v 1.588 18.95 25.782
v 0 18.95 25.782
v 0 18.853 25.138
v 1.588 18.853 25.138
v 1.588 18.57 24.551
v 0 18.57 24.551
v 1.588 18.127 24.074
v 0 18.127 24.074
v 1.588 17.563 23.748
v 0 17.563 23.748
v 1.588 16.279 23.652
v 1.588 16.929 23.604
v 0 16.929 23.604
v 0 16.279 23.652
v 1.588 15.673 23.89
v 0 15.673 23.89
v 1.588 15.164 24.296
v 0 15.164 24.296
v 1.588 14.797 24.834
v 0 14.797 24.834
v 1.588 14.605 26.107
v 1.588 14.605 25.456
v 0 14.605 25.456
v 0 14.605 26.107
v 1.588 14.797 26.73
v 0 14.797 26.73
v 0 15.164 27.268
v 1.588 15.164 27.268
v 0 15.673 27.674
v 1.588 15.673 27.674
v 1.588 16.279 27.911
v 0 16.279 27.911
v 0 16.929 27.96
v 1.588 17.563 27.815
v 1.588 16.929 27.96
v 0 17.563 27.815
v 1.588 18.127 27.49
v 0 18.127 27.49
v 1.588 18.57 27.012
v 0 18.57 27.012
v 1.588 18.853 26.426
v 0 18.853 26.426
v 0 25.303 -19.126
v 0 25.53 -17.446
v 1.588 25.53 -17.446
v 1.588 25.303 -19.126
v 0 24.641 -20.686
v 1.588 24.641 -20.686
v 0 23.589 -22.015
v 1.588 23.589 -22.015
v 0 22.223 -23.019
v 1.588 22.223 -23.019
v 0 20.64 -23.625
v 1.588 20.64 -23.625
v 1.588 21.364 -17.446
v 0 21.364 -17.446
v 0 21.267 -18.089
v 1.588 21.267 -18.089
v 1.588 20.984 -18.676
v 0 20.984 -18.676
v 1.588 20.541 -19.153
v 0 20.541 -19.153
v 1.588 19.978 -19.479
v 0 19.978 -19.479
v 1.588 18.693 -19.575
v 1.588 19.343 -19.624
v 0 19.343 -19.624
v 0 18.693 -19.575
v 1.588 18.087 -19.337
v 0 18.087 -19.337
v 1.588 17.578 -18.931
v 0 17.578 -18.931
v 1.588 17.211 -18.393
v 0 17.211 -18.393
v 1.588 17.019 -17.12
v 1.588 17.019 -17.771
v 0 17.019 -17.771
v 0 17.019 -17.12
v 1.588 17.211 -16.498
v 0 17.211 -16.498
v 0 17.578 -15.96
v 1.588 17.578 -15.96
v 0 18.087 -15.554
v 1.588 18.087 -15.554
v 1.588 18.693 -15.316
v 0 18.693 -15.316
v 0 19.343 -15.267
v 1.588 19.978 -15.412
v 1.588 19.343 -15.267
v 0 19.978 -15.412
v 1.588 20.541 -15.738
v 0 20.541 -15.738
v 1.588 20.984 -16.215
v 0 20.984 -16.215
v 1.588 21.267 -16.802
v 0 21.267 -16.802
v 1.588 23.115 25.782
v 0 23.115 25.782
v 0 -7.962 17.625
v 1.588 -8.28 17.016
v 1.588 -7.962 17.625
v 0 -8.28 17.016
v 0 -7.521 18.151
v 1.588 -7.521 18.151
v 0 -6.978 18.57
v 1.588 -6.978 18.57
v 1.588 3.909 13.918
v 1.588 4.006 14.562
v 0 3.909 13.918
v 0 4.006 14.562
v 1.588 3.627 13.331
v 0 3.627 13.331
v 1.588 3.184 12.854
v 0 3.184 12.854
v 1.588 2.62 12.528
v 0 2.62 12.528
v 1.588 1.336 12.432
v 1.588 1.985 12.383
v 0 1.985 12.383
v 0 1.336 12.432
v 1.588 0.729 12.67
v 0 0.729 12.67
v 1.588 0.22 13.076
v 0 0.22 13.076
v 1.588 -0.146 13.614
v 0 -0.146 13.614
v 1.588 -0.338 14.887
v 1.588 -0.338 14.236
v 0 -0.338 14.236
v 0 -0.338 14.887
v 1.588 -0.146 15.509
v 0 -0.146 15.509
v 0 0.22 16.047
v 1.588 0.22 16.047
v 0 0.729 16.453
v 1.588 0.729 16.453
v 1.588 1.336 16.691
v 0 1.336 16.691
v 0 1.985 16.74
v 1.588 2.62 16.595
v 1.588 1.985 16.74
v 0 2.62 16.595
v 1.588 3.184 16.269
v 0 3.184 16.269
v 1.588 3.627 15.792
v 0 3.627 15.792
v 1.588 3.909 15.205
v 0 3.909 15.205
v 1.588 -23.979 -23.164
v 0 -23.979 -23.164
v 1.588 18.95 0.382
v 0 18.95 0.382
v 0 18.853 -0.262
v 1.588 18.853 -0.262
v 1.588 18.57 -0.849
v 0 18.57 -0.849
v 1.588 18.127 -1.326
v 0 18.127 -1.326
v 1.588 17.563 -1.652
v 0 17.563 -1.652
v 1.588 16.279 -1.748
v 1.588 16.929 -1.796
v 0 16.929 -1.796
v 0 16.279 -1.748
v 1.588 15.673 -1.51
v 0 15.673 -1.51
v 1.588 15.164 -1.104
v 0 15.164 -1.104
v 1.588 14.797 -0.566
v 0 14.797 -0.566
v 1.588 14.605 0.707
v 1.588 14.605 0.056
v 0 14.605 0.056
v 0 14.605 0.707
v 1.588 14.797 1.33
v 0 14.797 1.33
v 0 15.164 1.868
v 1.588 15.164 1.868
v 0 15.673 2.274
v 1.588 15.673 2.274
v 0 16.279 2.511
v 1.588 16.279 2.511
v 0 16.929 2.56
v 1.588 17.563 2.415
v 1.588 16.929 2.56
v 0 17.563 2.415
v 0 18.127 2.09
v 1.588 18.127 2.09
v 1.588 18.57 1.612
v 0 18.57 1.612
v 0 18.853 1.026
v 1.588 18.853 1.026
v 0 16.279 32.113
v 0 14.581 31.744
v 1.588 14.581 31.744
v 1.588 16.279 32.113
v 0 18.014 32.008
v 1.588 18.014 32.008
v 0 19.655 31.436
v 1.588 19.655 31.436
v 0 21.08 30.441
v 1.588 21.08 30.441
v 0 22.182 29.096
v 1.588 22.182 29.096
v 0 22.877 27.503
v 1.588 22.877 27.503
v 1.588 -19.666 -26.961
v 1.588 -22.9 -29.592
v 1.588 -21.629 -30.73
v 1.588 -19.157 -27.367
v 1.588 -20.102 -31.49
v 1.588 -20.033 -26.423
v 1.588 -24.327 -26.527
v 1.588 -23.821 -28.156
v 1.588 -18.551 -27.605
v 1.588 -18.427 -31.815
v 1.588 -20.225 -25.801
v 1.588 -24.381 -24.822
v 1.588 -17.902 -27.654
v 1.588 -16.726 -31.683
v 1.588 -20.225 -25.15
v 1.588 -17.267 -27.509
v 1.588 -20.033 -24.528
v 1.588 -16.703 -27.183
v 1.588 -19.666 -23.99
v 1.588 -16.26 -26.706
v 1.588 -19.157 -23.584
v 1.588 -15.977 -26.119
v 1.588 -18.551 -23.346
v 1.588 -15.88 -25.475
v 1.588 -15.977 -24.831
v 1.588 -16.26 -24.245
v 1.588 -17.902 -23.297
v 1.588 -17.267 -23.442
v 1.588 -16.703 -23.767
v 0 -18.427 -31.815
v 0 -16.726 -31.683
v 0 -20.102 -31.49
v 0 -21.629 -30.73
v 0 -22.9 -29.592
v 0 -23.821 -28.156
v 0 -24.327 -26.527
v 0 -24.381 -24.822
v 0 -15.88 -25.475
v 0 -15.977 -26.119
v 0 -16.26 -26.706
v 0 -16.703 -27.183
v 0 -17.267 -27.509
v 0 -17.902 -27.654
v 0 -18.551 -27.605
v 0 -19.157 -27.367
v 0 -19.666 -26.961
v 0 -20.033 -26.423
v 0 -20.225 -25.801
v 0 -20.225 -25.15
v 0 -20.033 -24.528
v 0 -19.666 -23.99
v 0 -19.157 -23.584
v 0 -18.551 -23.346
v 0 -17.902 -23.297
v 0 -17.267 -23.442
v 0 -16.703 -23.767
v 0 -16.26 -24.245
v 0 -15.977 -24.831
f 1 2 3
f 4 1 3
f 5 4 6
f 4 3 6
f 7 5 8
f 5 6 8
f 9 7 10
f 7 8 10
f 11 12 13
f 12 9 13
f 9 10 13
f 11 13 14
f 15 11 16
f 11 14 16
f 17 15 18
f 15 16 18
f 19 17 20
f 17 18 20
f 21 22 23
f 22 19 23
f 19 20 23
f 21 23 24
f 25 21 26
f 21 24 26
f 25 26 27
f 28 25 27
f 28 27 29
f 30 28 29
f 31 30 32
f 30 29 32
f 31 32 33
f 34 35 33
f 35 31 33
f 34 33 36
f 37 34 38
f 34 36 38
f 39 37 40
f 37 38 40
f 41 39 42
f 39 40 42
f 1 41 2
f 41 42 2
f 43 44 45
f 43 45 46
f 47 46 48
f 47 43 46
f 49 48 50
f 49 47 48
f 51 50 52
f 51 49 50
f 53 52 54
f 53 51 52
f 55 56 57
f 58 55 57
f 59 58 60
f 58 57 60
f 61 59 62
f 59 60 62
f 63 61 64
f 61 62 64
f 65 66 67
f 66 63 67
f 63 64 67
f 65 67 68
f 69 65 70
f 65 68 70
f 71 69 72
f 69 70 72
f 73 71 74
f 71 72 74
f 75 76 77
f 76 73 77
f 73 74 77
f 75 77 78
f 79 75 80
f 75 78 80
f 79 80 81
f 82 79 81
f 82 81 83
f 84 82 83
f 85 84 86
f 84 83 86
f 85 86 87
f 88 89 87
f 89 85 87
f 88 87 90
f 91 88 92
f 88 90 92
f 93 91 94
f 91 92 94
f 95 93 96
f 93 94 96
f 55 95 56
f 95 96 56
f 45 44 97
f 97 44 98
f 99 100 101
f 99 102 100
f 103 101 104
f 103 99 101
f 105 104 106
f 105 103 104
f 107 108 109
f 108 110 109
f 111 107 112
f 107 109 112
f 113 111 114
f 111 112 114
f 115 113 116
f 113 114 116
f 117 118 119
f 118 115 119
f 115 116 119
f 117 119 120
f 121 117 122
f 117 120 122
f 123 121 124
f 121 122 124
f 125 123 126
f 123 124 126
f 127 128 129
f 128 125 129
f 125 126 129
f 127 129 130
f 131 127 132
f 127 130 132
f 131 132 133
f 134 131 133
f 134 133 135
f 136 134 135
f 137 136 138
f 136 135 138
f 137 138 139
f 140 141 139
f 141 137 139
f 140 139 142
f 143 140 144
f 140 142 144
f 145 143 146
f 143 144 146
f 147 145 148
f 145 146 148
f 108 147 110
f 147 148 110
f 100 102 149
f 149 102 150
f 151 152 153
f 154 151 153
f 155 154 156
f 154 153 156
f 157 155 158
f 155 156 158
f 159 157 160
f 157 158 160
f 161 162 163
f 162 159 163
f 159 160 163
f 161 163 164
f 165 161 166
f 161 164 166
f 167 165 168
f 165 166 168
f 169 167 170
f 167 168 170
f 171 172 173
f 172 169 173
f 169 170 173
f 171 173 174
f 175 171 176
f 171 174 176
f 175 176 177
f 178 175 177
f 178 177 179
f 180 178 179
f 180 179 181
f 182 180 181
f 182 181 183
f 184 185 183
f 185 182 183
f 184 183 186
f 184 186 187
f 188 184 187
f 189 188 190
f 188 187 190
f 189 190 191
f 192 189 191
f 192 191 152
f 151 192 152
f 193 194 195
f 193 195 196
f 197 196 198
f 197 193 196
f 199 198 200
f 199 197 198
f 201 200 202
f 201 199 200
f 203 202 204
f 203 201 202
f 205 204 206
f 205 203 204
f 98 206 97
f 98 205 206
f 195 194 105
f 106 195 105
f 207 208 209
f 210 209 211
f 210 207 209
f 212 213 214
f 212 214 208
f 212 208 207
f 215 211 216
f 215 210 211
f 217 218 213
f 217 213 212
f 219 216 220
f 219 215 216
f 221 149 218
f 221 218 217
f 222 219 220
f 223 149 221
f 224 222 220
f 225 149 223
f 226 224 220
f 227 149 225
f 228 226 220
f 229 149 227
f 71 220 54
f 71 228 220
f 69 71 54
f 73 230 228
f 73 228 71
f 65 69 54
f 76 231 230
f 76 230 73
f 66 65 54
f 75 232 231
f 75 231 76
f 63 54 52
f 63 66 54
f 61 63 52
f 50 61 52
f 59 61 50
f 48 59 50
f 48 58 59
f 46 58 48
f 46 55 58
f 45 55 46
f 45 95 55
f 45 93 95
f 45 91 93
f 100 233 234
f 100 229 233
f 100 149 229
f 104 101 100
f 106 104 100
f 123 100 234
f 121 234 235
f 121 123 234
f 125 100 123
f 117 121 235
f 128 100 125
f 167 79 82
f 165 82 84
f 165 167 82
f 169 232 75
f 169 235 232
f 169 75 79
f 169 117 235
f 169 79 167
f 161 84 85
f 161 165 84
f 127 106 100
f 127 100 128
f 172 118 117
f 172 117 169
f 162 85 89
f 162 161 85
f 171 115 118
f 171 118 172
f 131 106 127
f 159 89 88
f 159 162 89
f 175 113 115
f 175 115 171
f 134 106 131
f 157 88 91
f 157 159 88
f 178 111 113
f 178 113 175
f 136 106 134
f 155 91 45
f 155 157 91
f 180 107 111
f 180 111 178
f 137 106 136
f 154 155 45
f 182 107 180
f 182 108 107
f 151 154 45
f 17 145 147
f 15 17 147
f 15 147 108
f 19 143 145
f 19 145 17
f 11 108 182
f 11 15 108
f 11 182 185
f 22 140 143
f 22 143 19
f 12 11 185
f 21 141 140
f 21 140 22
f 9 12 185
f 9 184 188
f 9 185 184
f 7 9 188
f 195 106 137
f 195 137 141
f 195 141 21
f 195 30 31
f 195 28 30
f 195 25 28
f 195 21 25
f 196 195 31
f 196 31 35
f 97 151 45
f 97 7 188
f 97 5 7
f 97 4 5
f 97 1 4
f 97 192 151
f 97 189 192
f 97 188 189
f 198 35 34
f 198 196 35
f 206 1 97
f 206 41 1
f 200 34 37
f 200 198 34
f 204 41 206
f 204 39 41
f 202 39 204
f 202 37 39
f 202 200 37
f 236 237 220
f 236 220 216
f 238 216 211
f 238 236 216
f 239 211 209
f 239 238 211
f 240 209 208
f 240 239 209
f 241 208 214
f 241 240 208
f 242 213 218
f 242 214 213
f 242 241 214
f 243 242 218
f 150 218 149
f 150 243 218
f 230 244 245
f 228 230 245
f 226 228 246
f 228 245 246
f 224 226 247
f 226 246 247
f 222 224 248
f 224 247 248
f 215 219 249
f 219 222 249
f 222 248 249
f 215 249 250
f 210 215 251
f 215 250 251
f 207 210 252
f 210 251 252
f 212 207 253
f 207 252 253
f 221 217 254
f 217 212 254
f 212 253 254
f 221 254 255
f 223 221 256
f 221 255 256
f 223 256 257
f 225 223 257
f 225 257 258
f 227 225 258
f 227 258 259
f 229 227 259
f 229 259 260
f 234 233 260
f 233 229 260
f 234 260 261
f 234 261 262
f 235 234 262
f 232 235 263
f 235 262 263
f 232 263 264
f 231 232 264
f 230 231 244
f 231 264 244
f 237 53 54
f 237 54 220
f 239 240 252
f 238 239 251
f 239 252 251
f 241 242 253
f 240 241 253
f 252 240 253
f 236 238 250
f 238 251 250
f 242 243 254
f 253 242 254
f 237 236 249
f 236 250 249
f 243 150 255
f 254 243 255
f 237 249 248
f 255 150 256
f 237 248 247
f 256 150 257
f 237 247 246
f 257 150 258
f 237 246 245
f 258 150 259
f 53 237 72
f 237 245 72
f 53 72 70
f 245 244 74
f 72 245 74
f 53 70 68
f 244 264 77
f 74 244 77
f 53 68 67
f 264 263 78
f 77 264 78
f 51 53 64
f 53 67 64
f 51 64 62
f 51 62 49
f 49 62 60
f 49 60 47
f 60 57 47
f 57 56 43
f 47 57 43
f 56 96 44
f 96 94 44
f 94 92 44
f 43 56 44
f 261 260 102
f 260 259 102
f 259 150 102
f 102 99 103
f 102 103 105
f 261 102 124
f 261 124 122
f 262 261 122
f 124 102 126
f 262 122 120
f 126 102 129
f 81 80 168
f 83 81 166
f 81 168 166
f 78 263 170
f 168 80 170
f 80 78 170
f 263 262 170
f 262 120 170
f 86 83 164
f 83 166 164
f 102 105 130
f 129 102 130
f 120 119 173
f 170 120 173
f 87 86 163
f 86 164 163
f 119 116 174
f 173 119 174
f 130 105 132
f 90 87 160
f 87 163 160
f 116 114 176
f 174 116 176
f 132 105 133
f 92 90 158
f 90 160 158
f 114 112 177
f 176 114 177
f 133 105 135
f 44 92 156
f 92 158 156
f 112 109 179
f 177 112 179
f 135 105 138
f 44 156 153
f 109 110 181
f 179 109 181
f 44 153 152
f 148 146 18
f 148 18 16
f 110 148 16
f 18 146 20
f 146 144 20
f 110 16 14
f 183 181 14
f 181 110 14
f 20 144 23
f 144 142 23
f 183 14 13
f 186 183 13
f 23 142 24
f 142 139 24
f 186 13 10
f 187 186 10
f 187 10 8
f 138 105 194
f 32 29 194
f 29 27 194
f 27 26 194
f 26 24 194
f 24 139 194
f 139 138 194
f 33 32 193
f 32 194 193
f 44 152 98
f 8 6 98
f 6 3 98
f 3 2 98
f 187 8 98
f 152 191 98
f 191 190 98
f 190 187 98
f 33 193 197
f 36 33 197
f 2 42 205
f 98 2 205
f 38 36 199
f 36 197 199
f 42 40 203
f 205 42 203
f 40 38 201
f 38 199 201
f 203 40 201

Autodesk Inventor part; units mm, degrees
ref_plane "YZ Plane" through (0, 0, 0) normal (1, 0, 0) x (0, 1, 0)
ref_plane "XZ Plane" through (0, 0, 0) normal (0, 1, 0) x (-1, 0, 0)
ref_plane "XY Plane" through (0, 0, 0) normal (0, 0, 1) x (1, 0, 0)
sketch "Sketch1" plane through (0, 0, 0) normal (1, 0, 0) x (0, 1, 0)
  circle A0 centre (1.8217, 14.5615) radius 2.1844
  circle A1 centre (16.7653, 25.7818) radius 2.1844
  circle A2 centre (16.7653, 0.3818) radius 2.1844
  circle A3 centre (19.1795, -17.4456) radius 2.1844
  circle A4 centre (-18.0648, -25.4753) radius 2.1844
  circle A5 centre (19.1795, -17.4456) radius 6.35
  circle A6 centre (16.7653, 25.7818) radius 6.35
  circle A7 centre (-18.0648, -25.4753) radius 6.35
  line L0 (20.6395, -23.6254) -> (-16.7263, -31.6826)
  line L1 (25.5295, -17.4456) -> (23.1153, 25.7818)
  line L2 (14.5809, 31.7443) -> (-6.9779, 18.5698)
  line L3 (-8.2796, 17.0161) -> (-23.9793, -23.1643)
  arc A8 (-6.9779, 18.5698) -> (-8.2796, 17.0161) centre (-5.3223, 15.8607) ccw
  point P0 (0, 0)
  dimension "d0" = 12.7
  dimension "d1" = 12.7
  dimension "d2" = 12.7
  dimension "d3" = 3.175
extrude "Extrusion1" add sketch "Sketch1" along normal blind 1.5875 contours A5 L1 | L0 A7 L3 A8 L2 A6 L1 A5 | A7 | A6 L2 picked at (18.545, -22.3352) picked at (14.1871, 29.9232)
properties part number "lbsupport"
